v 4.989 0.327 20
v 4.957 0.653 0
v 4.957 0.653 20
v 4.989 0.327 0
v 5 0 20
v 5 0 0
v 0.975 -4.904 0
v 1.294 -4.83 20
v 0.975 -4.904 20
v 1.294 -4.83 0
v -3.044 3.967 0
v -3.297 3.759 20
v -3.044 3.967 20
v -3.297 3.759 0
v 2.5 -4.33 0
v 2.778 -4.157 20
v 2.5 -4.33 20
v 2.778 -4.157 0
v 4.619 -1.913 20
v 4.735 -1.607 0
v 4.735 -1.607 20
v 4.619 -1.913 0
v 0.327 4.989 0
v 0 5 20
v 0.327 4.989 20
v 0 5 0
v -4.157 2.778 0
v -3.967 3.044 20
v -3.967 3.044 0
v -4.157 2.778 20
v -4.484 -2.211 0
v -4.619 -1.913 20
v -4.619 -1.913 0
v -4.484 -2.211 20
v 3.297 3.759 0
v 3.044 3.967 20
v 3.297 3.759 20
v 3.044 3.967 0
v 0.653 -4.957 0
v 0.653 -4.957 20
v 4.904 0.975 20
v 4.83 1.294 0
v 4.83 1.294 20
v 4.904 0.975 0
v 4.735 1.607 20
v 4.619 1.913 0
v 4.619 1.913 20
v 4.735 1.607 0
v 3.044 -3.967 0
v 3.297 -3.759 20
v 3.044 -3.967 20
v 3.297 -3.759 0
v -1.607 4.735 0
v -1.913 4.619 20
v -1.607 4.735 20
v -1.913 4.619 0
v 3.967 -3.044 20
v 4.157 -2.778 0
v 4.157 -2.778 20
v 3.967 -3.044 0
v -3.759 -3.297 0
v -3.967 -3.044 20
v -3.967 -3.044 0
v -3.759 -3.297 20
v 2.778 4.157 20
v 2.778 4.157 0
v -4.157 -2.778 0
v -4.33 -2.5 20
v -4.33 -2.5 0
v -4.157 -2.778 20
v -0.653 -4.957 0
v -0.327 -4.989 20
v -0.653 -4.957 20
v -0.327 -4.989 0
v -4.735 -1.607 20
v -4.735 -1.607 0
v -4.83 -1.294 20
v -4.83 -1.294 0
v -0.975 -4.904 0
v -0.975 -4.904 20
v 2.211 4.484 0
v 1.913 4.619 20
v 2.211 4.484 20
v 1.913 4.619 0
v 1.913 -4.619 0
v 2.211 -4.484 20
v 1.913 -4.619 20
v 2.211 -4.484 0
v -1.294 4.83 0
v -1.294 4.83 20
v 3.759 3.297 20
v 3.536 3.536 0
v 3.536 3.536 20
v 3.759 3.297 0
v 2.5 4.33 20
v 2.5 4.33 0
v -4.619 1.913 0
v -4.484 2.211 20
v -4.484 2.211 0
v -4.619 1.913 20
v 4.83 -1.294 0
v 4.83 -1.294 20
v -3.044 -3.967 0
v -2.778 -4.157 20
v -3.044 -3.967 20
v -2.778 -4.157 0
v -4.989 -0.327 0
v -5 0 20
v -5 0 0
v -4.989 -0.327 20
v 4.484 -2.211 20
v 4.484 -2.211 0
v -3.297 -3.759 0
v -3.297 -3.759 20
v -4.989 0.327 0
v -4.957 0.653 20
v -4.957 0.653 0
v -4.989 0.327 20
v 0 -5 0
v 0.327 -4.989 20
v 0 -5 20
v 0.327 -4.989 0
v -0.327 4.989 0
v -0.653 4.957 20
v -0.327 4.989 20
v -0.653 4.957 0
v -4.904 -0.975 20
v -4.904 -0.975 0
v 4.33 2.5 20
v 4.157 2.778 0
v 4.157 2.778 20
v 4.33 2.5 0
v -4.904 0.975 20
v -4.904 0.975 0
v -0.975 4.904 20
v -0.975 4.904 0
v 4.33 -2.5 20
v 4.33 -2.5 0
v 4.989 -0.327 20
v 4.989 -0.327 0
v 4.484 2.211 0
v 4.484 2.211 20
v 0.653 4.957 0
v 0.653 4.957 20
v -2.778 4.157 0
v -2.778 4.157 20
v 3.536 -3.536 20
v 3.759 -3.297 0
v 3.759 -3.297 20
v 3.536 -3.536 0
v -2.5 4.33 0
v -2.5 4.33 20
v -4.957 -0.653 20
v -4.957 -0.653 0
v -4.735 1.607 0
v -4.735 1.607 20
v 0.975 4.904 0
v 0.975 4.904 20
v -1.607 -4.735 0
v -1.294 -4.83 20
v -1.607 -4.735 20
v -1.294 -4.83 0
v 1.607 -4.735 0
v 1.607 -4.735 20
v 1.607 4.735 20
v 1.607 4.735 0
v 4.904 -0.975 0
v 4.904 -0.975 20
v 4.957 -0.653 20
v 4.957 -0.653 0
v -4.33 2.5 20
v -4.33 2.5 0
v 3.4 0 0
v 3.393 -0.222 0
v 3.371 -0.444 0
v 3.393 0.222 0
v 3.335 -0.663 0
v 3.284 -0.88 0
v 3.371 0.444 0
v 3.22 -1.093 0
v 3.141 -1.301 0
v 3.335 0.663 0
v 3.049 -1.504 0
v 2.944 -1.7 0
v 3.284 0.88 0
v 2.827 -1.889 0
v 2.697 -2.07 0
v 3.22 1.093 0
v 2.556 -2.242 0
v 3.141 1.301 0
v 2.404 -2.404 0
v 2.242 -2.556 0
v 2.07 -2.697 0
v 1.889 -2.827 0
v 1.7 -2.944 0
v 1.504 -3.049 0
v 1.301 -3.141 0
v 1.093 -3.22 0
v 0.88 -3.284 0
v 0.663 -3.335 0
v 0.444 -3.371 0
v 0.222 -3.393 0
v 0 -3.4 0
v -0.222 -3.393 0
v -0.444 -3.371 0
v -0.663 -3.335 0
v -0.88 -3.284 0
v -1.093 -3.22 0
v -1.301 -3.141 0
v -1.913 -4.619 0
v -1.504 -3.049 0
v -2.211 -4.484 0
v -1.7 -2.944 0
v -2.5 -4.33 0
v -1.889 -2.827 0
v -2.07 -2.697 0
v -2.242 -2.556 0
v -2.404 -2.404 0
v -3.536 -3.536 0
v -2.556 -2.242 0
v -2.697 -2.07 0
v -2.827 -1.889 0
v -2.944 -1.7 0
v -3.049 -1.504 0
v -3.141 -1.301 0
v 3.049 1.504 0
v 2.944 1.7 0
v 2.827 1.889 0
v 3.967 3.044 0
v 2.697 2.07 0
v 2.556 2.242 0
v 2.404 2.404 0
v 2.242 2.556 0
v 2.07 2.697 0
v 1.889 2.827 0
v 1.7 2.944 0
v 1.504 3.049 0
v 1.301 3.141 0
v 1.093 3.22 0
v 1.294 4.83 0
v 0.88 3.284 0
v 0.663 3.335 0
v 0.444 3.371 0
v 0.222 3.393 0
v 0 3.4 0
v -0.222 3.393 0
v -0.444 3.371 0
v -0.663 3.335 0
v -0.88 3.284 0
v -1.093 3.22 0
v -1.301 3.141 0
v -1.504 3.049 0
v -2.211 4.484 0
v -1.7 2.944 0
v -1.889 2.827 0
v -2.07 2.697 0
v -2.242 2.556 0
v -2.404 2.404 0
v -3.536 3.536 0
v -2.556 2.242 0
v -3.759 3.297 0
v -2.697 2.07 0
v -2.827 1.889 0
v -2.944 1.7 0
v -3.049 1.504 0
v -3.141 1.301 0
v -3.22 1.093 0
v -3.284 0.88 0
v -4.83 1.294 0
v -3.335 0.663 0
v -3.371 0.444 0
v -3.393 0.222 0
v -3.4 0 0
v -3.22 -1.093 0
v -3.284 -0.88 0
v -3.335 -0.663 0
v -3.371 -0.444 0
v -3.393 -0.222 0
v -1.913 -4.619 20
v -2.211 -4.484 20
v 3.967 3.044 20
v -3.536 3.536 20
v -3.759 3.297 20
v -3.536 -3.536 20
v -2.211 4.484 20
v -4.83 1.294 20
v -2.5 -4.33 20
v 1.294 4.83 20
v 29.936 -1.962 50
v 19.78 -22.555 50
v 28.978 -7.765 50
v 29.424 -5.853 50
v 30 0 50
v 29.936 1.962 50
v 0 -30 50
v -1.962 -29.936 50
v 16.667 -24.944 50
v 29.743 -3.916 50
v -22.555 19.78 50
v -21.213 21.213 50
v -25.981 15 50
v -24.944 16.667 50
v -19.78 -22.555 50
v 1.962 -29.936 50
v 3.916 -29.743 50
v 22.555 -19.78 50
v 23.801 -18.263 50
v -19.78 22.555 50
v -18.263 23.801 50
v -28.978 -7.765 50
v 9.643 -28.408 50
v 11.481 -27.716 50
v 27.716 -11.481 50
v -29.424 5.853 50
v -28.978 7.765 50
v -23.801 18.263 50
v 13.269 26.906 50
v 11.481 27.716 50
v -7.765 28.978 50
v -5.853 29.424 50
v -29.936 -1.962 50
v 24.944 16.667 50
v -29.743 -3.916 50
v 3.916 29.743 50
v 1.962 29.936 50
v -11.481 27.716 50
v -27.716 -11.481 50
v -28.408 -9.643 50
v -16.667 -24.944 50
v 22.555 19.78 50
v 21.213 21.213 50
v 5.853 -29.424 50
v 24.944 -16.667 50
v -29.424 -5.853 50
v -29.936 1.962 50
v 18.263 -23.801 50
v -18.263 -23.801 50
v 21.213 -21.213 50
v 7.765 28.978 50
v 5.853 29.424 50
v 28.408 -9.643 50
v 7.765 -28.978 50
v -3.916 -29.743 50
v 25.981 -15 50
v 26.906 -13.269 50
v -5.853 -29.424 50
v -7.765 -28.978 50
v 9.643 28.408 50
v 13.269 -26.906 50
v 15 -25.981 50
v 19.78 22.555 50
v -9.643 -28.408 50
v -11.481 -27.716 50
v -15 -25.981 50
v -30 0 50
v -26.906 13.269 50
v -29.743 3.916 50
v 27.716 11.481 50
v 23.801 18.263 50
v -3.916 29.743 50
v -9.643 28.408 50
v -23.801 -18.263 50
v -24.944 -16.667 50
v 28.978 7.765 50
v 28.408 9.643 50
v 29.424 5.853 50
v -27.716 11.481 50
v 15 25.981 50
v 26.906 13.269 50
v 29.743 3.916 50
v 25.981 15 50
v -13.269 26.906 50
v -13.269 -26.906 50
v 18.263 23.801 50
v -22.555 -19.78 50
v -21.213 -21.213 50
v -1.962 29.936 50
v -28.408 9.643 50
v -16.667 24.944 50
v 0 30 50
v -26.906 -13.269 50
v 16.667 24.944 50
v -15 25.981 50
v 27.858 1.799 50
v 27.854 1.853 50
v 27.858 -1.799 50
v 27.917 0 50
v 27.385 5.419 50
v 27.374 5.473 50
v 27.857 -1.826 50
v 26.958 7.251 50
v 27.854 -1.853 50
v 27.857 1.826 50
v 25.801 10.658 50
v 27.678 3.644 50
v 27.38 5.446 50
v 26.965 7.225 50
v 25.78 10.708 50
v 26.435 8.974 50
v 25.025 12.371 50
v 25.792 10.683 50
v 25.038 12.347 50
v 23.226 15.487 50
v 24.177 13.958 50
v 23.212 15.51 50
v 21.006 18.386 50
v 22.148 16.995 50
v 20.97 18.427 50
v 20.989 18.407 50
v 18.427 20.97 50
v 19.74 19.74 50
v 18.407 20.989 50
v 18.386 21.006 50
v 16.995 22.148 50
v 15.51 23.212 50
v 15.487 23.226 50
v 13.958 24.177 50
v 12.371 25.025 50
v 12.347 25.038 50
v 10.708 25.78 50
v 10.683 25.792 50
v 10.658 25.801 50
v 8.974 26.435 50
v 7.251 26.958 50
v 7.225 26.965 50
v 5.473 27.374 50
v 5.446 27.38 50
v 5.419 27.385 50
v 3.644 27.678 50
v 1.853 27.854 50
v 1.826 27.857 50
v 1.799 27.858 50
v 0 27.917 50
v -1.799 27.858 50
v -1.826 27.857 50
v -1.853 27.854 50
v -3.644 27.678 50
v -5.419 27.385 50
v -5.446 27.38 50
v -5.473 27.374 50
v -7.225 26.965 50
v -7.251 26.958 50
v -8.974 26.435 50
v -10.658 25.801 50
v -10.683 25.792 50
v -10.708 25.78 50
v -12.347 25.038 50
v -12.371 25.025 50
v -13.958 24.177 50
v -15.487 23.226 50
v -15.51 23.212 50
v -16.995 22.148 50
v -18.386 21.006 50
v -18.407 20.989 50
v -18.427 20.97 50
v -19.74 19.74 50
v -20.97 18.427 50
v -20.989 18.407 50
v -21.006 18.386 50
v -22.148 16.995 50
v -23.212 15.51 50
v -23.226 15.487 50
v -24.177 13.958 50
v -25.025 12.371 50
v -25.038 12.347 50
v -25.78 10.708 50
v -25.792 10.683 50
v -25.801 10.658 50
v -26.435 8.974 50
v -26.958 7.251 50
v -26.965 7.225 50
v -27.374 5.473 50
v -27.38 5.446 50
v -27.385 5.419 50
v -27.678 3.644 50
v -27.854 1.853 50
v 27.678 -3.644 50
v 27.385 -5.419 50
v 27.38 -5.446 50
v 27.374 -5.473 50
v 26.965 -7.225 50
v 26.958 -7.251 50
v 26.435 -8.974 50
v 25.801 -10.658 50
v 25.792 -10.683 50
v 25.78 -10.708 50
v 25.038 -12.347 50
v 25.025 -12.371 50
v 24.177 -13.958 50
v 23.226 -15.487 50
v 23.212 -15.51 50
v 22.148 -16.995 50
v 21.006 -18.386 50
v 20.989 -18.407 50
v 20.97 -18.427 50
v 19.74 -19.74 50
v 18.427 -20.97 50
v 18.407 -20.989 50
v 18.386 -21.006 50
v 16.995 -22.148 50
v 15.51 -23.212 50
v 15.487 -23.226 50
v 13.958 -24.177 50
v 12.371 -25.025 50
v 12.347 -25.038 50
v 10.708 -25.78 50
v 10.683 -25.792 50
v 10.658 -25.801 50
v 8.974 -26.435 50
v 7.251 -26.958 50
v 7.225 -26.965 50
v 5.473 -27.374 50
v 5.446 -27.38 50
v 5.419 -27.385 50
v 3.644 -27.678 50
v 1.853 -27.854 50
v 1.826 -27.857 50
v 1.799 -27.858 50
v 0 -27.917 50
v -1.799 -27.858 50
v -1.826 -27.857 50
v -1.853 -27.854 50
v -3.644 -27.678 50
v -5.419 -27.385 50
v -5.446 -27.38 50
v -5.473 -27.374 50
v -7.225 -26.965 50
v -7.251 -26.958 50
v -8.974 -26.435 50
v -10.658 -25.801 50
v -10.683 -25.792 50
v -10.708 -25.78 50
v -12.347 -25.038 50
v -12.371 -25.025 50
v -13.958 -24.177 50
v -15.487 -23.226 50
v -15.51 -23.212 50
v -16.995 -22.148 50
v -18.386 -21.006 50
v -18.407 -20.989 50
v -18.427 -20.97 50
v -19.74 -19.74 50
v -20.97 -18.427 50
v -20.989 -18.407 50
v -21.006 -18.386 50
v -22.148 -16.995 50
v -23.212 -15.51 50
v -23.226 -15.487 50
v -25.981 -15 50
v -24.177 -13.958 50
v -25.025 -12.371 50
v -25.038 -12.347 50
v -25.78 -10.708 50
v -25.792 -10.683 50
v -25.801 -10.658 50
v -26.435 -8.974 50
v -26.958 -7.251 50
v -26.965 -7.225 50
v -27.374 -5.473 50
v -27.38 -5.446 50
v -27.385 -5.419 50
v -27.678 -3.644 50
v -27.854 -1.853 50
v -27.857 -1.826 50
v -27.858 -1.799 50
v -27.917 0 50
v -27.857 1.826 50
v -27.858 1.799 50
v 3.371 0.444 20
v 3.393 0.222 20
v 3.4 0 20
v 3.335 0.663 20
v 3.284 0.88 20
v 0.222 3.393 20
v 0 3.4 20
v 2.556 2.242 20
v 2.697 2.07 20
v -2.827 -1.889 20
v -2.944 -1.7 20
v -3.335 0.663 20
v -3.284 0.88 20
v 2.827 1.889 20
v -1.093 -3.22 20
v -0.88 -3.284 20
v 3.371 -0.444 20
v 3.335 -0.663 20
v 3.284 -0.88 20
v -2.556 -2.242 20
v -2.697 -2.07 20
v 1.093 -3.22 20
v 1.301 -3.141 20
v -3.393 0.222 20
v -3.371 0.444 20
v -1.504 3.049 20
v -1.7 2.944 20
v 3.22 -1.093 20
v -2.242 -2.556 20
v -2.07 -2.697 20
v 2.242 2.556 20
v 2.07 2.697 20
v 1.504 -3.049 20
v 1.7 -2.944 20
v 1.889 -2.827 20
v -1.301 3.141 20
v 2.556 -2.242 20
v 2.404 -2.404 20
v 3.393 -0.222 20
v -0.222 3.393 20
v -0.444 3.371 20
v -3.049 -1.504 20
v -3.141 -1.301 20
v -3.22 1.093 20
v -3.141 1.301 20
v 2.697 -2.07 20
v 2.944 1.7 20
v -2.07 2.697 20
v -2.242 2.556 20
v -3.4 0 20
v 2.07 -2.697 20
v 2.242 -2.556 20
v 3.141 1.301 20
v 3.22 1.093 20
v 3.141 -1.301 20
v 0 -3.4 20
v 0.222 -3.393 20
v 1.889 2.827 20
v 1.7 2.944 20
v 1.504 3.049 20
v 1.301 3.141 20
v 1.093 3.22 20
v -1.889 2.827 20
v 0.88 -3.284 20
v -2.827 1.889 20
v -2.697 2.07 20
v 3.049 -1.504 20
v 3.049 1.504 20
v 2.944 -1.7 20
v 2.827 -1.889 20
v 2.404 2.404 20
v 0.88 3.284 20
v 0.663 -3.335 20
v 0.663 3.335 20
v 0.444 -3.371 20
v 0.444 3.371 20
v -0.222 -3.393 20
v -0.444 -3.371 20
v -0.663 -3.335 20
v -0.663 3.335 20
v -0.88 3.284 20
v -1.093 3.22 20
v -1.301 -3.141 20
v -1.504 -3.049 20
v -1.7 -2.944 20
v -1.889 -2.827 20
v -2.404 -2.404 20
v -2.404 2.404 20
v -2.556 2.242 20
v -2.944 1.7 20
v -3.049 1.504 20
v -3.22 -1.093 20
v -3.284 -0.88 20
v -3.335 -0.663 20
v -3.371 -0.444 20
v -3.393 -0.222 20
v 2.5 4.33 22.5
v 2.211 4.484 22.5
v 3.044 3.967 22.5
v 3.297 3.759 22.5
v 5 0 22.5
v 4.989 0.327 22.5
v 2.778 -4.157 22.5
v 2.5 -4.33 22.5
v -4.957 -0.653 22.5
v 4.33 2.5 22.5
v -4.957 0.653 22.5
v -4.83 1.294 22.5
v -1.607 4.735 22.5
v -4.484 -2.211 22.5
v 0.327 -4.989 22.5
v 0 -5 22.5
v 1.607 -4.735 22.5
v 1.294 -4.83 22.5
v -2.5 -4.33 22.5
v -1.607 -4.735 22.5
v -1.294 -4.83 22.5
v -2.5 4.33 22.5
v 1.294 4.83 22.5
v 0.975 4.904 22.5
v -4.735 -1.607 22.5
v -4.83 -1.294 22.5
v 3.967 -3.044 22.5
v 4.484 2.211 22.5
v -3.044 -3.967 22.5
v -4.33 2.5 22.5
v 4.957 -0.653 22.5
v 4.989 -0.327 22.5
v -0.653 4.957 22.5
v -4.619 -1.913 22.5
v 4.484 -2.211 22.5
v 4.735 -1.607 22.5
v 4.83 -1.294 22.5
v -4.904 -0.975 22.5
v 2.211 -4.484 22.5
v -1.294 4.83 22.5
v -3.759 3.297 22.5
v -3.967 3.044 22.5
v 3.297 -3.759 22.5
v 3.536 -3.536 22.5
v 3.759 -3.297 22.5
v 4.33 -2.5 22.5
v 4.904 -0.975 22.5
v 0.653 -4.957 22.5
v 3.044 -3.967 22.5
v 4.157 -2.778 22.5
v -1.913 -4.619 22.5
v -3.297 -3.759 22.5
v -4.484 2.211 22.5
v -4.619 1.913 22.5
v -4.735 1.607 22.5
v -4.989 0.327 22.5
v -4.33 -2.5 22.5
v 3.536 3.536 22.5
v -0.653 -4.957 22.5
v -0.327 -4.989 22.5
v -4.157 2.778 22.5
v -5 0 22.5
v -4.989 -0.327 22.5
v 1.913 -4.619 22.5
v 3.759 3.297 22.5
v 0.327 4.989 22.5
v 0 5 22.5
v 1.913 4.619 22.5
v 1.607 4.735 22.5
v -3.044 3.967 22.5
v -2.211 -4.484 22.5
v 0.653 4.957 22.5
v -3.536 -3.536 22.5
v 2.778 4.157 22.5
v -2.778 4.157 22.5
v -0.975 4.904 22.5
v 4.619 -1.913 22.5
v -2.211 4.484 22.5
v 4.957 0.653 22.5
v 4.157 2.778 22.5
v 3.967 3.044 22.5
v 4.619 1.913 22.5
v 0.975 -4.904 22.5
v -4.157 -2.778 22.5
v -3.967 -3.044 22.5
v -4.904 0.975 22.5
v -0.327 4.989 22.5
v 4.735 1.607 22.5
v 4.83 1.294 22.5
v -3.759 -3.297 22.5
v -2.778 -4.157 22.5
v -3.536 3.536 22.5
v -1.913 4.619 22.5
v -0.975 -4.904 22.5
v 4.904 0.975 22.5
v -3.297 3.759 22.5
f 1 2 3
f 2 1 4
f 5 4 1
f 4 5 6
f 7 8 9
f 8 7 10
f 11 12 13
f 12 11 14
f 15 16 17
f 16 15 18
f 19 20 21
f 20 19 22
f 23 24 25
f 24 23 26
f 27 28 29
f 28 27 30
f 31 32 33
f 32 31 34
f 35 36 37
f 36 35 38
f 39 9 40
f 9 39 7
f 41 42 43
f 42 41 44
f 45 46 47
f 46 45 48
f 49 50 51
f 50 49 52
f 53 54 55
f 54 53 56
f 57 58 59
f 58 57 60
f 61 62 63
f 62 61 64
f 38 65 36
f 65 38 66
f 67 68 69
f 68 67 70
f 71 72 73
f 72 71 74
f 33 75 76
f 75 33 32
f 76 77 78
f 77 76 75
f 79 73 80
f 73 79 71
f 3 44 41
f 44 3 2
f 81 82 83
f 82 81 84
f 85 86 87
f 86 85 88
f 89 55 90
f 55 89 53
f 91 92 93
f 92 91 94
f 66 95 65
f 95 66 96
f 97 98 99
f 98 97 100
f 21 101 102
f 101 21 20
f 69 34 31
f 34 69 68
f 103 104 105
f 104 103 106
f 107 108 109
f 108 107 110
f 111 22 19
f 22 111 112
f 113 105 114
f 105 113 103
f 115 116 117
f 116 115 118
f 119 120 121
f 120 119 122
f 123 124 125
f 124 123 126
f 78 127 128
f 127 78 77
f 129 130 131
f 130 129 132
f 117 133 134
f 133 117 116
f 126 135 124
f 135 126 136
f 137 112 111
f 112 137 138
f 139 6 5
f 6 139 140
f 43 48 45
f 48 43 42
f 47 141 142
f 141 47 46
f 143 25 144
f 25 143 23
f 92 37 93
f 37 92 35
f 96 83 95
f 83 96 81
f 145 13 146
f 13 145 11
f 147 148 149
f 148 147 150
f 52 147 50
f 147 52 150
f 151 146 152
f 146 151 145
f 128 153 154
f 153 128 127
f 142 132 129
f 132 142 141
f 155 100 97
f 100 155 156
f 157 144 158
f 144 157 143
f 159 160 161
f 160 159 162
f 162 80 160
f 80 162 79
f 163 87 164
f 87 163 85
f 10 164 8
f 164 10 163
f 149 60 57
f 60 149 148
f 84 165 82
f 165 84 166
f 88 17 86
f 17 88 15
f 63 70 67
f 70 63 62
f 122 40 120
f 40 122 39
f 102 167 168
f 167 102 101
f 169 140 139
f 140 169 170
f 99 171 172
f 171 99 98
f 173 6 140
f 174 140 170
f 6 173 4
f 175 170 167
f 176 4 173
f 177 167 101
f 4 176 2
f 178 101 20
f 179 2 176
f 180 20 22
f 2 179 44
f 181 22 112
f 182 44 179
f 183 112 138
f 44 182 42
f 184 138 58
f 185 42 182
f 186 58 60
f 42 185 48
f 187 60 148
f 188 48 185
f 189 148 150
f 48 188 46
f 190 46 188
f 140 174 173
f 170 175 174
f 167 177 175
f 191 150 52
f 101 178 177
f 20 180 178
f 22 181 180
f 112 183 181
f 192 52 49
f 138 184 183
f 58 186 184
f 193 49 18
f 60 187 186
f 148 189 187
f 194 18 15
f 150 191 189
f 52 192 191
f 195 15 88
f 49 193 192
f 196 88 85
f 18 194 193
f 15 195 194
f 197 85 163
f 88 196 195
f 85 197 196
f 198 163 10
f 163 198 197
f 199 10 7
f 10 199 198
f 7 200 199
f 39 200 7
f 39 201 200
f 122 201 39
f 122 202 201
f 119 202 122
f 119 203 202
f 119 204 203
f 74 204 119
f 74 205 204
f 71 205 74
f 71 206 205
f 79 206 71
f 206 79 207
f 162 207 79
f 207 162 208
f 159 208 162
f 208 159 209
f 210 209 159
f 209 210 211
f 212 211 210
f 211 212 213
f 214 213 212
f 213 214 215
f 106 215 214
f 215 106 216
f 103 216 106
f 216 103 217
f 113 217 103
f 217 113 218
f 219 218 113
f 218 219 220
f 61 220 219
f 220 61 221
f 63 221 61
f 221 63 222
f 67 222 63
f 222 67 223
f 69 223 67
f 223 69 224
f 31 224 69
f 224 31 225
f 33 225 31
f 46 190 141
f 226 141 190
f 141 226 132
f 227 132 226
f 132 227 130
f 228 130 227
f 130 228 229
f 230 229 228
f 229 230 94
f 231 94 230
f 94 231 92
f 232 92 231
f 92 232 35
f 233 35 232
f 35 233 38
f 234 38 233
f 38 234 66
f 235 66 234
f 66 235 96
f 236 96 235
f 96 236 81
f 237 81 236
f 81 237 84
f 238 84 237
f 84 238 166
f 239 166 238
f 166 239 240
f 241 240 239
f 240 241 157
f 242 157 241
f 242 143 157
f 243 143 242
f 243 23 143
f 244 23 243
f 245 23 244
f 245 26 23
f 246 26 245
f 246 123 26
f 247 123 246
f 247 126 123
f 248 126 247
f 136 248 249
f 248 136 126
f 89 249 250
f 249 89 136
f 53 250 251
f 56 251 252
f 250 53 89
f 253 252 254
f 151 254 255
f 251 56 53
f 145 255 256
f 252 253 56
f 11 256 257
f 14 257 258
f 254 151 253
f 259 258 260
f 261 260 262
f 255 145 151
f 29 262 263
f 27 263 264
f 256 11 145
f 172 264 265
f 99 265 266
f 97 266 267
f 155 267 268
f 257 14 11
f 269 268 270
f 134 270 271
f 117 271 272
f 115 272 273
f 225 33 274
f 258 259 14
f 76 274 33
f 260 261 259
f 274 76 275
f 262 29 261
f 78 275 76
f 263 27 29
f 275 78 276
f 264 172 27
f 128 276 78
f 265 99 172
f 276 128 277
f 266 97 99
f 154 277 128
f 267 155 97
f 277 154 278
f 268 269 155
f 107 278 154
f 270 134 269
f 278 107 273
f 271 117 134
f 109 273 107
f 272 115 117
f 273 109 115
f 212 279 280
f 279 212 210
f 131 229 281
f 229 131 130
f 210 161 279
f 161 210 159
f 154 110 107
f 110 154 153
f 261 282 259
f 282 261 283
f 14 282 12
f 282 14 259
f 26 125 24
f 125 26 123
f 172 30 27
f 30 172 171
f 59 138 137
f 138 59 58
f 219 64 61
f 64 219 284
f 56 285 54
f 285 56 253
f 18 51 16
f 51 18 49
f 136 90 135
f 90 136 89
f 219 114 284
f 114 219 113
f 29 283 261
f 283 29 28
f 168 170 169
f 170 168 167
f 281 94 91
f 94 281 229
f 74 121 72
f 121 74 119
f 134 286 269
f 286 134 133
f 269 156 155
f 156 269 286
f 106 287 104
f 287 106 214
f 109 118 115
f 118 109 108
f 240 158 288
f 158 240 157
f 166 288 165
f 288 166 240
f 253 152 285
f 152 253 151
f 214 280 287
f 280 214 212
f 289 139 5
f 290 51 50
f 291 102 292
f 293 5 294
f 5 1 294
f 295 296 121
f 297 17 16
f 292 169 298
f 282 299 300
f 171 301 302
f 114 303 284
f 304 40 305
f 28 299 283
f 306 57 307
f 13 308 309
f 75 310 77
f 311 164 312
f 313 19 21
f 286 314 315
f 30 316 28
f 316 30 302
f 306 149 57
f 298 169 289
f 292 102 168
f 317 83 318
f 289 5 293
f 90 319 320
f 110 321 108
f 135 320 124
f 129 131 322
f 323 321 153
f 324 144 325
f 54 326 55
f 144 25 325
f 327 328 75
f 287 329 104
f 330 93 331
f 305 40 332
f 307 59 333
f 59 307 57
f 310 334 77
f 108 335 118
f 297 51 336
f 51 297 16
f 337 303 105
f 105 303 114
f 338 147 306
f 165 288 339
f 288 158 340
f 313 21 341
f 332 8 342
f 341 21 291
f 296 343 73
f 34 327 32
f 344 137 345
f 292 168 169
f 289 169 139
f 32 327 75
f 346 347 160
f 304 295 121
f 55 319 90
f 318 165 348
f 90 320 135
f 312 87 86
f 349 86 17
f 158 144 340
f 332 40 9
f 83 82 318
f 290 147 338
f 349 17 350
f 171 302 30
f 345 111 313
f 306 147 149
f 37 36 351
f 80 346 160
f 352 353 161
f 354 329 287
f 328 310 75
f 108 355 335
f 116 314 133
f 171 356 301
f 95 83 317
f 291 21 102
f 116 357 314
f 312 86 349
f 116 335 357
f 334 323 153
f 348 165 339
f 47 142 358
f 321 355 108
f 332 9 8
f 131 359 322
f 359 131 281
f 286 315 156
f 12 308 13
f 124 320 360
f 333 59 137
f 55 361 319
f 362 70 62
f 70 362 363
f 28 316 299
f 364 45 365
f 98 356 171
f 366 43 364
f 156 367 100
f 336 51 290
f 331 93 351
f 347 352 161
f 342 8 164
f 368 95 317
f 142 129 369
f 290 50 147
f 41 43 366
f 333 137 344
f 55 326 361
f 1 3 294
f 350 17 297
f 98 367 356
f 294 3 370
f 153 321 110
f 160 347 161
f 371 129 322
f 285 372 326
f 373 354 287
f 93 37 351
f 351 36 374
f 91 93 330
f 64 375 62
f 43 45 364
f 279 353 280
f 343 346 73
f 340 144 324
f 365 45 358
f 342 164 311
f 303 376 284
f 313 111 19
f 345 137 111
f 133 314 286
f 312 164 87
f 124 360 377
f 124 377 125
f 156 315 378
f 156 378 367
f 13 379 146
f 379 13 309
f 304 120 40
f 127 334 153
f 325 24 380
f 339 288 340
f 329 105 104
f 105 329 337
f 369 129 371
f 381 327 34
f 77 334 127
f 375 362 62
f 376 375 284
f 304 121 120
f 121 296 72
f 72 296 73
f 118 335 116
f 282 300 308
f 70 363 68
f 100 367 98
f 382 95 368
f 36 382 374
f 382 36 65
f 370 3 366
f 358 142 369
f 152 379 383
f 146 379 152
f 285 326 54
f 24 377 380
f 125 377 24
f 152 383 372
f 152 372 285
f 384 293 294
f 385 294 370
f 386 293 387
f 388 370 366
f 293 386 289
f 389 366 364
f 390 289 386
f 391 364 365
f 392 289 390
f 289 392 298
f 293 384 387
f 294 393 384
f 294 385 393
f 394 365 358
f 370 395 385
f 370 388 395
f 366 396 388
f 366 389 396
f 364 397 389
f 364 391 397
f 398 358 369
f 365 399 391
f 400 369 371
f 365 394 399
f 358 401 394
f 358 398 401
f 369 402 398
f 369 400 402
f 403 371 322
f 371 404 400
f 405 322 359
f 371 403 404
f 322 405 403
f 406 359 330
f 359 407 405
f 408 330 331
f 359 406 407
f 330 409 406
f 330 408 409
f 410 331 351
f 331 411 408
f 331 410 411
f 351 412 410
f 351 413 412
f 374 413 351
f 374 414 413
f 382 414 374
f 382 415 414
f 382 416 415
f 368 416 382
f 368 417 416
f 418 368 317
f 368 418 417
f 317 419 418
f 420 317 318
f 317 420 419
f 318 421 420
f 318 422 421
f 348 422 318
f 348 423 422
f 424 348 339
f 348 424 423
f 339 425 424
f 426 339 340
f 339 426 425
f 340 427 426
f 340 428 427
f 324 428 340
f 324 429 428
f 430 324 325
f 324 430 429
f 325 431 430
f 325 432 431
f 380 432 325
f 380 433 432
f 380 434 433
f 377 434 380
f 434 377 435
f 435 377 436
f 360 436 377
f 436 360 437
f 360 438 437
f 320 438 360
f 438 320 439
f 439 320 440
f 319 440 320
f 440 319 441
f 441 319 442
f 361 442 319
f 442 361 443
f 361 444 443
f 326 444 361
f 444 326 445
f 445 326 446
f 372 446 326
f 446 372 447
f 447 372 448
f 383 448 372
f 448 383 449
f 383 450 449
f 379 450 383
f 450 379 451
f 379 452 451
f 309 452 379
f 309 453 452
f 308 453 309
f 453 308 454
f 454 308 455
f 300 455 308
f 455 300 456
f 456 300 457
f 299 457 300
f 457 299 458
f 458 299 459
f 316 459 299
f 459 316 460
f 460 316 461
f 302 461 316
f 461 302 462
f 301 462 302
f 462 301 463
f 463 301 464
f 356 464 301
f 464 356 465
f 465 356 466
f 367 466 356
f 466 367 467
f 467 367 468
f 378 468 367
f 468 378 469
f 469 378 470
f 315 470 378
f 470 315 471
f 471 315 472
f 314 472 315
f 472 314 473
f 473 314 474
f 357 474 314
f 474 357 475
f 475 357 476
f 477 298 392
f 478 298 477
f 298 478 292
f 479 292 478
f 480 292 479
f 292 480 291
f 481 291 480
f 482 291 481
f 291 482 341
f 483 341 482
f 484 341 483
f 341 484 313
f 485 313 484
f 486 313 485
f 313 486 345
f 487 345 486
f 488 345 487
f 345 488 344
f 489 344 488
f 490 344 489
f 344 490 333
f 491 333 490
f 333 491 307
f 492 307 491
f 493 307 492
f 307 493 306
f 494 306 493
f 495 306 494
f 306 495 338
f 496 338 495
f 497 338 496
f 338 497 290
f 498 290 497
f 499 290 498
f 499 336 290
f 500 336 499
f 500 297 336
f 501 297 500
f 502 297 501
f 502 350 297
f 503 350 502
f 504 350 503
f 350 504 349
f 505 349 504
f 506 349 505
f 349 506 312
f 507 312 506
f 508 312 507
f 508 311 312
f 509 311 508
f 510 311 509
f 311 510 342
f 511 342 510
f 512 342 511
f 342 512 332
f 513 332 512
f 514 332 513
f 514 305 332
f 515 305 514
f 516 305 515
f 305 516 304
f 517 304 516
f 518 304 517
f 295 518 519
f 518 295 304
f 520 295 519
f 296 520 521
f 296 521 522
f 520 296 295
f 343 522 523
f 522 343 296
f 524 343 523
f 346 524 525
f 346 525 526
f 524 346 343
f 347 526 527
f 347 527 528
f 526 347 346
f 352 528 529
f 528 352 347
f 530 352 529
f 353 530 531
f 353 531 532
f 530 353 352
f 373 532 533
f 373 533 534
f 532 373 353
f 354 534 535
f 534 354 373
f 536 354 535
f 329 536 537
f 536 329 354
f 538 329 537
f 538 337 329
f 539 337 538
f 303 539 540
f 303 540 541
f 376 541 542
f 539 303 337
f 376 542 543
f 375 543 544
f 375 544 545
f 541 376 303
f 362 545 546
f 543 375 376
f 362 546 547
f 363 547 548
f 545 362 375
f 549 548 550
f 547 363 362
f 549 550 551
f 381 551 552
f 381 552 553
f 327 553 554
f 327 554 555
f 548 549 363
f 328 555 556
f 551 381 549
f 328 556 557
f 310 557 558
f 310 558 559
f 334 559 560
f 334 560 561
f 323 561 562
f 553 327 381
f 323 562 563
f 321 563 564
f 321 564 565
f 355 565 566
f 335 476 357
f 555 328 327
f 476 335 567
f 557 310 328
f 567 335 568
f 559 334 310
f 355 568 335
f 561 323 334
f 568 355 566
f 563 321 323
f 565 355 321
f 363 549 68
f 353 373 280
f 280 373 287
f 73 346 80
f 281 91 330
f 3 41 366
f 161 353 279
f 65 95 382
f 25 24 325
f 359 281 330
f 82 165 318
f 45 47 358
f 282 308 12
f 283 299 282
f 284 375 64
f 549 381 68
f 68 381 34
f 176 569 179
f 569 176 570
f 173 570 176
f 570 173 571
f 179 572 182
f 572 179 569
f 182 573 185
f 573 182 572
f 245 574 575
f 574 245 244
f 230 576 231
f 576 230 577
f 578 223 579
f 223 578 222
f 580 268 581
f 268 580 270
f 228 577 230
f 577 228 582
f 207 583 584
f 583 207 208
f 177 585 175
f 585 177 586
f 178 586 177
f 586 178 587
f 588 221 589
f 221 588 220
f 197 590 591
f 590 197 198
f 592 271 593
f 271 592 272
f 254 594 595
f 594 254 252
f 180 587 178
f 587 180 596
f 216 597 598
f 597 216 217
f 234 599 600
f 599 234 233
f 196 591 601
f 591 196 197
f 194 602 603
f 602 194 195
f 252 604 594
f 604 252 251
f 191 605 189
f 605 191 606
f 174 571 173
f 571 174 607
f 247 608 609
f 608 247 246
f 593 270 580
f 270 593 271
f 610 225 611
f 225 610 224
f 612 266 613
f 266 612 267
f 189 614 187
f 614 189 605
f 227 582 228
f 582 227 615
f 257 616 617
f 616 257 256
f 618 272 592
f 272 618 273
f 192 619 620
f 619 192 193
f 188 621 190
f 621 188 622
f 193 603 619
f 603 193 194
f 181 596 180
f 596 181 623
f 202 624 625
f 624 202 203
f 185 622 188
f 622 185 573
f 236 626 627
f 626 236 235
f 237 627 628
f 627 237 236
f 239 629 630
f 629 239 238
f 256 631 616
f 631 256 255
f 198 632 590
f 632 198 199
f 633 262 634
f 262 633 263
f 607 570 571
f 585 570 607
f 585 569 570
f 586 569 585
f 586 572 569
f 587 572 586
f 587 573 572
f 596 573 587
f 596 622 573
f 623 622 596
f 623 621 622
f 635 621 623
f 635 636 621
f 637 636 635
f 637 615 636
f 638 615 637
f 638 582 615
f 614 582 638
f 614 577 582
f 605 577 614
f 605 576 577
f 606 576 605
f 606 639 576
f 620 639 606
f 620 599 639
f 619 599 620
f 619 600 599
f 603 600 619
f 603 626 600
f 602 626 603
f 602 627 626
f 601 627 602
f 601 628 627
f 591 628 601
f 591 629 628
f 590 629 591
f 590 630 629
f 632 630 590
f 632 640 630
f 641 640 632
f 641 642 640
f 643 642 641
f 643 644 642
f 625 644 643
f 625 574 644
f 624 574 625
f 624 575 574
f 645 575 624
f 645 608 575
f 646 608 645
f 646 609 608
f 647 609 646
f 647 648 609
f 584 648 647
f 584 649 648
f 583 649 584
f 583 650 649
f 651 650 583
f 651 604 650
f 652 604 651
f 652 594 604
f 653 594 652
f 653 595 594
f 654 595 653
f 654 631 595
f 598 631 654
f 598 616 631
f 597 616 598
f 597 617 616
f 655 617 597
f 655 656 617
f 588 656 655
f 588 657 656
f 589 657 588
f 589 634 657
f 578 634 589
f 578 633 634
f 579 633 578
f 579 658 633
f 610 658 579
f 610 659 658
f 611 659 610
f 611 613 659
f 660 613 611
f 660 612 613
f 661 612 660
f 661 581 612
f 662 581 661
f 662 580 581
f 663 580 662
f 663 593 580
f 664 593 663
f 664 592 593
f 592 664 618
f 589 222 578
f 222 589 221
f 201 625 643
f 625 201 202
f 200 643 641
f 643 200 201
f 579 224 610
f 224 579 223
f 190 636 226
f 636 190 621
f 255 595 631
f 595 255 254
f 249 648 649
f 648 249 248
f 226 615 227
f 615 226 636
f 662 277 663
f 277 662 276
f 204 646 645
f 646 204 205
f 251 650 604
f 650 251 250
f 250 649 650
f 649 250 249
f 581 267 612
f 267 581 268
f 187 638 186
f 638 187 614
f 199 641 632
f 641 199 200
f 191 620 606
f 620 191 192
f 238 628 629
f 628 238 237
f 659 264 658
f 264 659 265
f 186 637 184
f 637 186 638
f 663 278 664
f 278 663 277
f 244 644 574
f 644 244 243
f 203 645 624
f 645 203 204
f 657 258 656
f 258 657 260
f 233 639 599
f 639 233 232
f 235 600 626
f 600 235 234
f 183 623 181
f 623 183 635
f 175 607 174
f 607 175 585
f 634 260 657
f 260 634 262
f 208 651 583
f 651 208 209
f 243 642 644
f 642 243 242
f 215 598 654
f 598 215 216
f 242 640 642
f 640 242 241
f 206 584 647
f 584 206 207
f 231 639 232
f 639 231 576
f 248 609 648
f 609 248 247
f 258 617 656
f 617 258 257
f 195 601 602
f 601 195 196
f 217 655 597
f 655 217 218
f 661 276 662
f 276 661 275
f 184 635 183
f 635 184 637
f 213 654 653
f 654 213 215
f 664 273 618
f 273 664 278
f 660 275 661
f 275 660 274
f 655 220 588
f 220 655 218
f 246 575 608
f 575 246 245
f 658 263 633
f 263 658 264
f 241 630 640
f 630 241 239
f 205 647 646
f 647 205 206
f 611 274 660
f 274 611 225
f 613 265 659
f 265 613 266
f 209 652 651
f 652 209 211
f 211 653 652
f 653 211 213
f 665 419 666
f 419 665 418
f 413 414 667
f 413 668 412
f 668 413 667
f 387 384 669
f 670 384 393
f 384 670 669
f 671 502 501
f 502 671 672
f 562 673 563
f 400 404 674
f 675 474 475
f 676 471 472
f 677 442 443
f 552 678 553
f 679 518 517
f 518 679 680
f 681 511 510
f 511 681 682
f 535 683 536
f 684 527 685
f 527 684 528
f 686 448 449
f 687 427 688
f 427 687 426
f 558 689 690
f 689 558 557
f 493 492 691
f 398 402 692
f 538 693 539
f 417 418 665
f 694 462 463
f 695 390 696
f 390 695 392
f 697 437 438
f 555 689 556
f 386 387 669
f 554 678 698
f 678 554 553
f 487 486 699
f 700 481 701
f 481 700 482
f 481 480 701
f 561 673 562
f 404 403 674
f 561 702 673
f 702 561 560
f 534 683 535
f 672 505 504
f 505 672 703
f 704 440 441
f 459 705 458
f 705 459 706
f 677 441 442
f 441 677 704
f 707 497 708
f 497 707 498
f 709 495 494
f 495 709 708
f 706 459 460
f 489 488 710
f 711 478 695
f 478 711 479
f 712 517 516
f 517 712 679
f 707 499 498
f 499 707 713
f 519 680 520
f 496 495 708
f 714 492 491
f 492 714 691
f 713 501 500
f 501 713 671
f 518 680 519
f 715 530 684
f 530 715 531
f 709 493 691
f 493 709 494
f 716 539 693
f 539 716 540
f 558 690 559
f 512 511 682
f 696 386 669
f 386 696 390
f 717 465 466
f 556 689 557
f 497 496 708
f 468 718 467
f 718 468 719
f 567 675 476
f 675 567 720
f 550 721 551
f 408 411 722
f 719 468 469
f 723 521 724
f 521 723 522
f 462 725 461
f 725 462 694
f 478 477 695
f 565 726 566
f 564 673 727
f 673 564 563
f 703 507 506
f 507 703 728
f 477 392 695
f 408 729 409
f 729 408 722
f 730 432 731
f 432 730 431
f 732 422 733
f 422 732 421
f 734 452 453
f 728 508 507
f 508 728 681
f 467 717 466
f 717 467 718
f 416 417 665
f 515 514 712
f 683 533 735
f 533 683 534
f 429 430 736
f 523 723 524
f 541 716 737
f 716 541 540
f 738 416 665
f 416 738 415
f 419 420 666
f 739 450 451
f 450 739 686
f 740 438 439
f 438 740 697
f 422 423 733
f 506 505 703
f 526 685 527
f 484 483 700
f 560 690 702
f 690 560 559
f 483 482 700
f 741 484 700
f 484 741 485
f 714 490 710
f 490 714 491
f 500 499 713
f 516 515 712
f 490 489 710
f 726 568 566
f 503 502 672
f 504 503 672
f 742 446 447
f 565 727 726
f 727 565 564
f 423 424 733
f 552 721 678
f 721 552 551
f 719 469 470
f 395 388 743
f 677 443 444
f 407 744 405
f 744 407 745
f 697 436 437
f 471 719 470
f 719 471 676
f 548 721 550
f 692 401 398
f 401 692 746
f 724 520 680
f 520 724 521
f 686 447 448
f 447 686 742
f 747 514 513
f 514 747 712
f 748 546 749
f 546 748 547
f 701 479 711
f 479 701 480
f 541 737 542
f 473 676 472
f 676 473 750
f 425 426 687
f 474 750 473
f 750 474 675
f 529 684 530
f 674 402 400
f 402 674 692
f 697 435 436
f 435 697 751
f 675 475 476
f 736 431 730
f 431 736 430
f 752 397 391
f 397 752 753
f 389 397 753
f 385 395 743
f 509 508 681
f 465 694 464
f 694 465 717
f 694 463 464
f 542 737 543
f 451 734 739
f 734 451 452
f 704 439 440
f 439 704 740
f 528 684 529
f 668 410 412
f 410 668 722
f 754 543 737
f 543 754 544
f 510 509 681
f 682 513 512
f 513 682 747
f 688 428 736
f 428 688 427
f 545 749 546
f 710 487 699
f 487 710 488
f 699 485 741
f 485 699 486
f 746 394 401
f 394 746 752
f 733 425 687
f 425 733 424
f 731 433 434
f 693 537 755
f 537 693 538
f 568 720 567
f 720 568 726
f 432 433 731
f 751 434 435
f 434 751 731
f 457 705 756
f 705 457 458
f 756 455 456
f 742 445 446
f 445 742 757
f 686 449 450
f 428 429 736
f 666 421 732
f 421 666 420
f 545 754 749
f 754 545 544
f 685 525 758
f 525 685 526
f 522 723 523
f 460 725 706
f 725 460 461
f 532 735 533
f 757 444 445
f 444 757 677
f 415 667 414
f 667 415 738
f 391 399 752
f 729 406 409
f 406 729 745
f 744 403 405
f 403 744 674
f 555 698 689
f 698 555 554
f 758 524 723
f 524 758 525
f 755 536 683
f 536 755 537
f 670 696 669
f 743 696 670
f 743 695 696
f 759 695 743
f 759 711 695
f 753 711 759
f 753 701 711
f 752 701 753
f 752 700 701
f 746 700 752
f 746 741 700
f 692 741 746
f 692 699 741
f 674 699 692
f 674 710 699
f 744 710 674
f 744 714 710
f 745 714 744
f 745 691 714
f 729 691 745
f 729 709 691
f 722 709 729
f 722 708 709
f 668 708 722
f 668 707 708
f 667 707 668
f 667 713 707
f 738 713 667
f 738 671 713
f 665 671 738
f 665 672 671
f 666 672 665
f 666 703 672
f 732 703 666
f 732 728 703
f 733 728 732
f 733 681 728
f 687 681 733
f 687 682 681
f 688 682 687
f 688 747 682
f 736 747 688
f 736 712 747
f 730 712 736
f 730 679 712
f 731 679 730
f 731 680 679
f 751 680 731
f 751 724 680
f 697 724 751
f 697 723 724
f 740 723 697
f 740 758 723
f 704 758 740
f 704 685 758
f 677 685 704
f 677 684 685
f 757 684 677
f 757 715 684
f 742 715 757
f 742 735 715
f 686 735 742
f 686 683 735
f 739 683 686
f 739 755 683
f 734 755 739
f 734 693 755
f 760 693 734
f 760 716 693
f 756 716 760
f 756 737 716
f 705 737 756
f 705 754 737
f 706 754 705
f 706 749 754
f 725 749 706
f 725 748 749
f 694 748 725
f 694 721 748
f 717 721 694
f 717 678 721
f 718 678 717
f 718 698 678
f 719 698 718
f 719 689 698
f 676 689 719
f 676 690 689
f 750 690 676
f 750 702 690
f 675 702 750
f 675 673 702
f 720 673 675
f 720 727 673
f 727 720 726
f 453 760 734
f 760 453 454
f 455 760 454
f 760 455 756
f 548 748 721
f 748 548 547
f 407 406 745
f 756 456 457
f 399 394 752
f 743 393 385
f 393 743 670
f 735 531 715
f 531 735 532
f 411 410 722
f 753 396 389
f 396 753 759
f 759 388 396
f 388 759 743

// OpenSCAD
$fn=96;
difference(){
  union(){ cylinder(d=10,h=20); translate([0,0,20]) cylinder(d1=10,d2=60,h=30); }
  translate([0,0,-1]) cylinder(d=6.8,h=21);              // spout bore up to z=20
  translate([0,0,22.5]) cylinder(d1=10,d2=60,h=30);      // cone hollowed by raising it 2.5 mm
}
